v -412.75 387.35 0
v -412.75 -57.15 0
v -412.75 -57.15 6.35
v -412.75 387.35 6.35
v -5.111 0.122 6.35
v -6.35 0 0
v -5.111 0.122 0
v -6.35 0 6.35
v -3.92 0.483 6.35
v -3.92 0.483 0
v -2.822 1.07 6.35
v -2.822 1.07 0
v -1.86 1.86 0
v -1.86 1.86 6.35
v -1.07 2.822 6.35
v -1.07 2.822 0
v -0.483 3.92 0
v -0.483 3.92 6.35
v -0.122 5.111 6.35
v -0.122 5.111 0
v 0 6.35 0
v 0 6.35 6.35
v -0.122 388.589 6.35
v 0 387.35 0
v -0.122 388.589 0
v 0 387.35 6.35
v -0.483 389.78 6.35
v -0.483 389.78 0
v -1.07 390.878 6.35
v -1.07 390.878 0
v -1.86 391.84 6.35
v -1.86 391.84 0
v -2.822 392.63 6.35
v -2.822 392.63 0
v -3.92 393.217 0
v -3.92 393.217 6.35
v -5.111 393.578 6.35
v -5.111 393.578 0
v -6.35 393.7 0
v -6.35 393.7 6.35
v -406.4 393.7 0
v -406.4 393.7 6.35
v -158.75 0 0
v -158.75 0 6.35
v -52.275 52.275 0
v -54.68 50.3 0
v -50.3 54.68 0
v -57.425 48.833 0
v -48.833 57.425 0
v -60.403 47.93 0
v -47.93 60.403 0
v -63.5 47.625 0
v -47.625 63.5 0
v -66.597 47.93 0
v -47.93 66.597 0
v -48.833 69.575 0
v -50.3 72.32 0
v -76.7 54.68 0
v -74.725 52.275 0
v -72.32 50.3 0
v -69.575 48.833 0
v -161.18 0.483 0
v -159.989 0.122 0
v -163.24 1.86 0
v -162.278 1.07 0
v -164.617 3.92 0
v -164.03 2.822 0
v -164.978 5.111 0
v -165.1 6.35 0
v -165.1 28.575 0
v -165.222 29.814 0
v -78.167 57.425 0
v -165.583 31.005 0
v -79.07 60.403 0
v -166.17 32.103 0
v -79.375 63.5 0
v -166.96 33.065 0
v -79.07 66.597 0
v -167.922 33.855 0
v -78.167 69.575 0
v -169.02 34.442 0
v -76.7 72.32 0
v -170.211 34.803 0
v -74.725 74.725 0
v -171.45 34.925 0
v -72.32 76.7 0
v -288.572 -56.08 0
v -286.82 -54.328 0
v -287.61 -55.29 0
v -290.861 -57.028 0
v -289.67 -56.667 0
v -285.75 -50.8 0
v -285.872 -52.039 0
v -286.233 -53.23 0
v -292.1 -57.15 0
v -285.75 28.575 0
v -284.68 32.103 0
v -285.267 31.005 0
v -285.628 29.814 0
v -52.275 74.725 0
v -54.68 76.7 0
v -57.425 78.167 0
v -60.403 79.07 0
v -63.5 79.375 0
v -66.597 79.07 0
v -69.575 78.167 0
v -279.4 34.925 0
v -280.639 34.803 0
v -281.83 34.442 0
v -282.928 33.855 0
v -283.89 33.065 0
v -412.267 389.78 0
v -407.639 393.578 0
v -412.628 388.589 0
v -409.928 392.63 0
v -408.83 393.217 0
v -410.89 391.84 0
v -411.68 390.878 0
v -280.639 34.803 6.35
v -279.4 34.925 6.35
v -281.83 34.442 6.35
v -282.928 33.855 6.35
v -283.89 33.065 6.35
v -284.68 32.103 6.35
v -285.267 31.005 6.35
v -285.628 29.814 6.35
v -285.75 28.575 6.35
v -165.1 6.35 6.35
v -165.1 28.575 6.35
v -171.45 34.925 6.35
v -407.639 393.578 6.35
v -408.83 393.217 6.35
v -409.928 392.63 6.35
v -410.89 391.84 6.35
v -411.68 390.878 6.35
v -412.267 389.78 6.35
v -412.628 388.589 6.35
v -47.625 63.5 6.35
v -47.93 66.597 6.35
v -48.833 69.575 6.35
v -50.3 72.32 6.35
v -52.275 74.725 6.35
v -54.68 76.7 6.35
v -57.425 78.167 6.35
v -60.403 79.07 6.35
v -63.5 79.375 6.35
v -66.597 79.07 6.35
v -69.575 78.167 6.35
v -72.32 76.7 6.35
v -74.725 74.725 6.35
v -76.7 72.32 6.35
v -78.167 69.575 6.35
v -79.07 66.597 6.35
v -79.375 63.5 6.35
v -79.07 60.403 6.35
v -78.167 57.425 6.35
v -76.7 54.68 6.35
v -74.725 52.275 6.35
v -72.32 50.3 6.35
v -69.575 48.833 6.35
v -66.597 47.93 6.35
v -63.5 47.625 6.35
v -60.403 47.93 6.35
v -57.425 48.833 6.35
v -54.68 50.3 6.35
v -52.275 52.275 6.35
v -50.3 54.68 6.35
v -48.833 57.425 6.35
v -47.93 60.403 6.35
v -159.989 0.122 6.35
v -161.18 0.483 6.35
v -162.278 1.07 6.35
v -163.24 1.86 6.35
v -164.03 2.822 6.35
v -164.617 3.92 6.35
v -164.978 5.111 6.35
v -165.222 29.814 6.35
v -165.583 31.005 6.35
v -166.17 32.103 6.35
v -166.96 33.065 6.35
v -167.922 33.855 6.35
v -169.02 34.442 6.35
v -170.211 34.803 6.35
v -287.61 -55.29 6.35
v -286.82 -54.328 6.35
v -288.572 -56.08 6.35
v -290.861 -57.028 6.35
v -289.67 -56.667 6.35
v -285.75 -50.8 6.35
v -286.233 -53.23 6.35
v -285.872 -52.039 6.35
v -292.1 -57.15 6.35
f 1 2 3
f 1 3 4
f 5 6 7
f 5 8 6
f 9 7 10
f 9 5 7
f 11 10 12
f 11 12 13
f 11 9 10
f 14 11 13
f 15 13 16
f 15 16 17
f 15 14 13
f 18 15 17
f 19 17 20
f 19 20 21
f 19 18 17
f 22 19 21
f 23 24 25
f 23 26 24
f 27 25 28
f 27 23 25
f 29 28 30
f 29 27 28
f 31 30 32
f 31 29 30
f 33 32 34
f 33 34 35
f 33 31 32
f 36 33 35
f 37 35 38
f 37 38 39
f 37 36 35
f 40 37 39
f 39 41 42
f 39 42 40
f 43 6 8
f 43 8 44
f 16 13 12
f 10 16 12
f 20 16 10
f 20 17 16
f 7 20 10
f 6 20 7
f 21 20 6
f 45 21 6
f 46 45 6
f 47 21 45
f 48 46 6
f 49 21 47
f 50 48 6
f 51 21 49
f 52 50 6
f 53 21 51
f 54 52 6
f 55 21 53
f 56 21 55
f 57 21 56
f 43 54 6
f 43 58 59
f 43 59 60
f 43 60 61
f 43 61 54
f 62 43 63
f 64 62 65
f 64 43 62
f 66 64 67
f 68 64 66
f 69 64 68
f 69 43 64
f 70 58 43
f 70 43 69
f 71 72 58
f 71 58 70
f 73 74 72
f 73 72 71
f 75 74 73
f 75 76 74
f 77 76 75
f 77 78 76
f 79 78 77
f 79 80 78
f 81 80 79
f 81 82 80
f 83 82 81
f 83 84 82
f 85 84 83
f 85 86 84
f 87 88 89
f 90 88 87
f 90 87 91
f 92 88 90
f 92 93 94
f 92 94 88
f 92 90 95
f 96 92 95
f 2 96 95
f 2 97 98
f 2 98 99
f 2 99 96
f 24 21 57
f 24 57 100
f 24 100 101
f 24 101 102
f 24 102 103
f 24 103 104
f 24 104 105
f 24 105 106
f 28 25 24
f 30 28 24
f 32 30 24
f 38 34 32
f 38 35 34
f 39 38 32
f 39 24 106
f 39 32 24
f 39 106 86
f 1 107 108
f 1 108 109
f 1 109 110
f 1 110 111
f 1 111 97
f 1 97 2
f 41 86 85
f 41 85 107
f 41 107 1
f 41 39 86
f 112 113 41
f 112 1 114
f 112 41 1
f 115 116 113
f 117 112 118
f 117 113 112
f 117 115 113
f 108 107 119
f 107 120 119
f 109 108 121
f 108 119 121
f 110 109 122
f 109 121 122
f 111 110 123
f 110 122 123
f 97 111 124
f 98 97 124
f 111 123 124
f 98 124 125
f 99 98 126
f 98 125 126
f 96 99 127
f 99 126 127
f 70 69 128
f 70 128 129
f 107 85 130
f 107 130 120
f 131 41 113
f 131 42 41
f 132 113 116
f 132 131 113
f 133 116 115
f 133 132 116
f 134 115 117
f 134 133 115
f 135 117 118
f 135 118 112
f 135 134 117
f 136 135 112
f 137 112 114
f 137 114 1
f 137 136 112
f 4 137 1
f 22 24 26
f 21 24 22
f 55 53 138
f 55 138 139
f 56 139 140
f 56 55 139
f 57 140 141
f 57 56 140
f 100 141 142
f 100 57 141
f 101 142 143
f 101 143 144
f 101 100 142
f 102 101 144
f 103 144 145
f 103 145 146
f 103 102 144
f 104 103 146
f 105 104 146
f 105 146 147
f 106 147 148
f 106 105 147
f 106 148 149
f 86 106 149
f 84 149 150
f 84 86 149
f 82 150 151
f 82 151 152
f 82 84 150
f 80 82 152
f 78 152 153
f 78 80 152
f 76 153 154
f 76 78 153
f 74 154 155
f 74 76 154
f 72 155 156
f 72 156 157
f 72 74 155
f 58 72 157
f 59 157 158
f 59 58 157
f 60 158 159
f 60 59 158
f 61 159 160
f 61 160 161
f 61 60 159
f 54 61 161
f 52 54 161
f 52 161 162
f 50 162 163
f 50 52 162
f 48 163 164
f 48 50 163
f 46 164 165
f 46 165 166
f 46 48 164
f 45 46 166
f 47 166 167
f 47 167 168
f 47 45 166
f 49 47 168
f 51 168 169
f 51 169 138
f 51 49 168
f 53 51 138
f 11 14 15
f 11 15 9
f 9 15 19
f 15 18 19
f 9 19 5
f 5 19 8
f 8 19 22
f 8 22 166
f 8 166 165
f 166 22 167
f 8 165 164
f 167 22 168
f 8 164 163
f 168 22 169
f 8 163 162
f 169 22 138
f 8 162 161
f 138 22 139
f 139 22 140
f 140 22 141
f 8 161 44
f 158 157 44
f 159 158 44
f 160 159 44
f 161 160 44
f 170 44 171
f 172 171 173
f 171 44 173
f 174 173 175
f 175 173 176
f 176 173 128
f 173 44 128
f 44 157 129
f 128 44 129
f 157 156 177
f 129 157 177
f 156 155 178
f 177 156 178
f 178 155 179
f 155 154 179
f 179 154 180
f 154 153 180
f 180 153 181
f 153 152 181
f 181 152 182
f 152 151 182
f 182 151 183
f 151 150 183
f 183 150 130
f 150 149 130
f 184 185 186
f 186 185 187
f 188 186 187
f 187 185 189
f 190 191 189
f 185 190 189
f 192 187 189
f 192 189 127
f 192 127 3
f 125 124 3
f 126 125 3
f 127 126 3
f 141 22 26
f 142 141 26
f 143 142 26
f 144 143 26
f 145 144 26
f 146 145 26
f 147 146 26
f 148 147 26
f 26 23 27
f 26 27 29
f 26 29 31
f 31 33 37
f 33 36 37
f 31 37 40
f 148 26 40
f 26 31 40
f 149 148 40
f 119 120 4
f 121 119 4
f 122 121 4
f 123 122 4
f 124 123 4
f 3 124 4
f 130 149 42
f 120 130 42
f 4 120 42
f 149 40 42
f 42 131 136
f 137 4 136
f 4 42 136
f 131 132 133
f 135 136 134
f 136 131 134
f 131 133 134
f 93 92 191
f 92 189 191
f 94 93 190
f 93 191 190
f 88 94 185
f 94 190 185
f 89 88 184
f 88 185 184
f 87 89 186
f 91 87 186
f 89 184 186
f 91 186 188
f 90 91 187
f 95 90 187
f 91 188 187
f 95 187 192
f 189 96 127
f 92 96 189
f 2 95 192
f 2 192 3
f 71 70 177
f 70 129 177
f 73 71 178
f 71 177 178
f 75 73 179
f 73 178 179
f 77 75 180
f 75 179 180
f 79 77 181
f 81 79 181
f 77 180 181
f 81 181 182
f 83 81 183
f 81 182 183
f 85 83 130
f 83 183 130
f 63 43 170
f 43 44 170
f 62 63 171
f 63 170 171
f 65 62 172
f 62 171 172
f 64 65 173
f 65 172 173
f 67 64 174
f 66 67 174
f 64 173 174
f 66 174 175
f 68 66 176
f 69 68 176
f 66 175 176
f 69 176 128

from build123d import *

# Parameters (mm, degrees)
SKETCH2_R           = 15.875
BOSS_EXTRUDE1_DEPTH = 6.35
FILLET1_R           = 6.35


with BuildPart() as part:
    # Sketch2 → Boss-Extrude1 (new body)
    with BuildSketch(Plane.XY):
        Polygon((0, 0), (-165.1, 0), (-165.1, 34.925), (-285.75, 34.925), (-285.75, -57.15), (-412.75, -57.15), (-412.75, 393.7), (0, 393.7), align=None)
        with Locations((-63.5, 63.5)):
            Circle(SKETCH2_R, mode=Mode.SUBTRACT)
    extrude(amount=BOSS_EXTRUDE1_DEPTH)

    # Fillet1
    fillet1_edges = [part.edges().sort_by_distance(p)[0] for p in [
        (-412.75, 393.7, 3.175),
        (0, 393.7, 3.175),
        (0, 0, 3.175),
        (-165.1, 0, 3.175),
        (-165.1, 34.925, 3.175),
        (-285.75, 34.925, 3.175),
        (-285.75, -57.15, 3.175),
    ]]
    fillet(fillet1_edges, radius=FILLET1_R)


solid = part.part
